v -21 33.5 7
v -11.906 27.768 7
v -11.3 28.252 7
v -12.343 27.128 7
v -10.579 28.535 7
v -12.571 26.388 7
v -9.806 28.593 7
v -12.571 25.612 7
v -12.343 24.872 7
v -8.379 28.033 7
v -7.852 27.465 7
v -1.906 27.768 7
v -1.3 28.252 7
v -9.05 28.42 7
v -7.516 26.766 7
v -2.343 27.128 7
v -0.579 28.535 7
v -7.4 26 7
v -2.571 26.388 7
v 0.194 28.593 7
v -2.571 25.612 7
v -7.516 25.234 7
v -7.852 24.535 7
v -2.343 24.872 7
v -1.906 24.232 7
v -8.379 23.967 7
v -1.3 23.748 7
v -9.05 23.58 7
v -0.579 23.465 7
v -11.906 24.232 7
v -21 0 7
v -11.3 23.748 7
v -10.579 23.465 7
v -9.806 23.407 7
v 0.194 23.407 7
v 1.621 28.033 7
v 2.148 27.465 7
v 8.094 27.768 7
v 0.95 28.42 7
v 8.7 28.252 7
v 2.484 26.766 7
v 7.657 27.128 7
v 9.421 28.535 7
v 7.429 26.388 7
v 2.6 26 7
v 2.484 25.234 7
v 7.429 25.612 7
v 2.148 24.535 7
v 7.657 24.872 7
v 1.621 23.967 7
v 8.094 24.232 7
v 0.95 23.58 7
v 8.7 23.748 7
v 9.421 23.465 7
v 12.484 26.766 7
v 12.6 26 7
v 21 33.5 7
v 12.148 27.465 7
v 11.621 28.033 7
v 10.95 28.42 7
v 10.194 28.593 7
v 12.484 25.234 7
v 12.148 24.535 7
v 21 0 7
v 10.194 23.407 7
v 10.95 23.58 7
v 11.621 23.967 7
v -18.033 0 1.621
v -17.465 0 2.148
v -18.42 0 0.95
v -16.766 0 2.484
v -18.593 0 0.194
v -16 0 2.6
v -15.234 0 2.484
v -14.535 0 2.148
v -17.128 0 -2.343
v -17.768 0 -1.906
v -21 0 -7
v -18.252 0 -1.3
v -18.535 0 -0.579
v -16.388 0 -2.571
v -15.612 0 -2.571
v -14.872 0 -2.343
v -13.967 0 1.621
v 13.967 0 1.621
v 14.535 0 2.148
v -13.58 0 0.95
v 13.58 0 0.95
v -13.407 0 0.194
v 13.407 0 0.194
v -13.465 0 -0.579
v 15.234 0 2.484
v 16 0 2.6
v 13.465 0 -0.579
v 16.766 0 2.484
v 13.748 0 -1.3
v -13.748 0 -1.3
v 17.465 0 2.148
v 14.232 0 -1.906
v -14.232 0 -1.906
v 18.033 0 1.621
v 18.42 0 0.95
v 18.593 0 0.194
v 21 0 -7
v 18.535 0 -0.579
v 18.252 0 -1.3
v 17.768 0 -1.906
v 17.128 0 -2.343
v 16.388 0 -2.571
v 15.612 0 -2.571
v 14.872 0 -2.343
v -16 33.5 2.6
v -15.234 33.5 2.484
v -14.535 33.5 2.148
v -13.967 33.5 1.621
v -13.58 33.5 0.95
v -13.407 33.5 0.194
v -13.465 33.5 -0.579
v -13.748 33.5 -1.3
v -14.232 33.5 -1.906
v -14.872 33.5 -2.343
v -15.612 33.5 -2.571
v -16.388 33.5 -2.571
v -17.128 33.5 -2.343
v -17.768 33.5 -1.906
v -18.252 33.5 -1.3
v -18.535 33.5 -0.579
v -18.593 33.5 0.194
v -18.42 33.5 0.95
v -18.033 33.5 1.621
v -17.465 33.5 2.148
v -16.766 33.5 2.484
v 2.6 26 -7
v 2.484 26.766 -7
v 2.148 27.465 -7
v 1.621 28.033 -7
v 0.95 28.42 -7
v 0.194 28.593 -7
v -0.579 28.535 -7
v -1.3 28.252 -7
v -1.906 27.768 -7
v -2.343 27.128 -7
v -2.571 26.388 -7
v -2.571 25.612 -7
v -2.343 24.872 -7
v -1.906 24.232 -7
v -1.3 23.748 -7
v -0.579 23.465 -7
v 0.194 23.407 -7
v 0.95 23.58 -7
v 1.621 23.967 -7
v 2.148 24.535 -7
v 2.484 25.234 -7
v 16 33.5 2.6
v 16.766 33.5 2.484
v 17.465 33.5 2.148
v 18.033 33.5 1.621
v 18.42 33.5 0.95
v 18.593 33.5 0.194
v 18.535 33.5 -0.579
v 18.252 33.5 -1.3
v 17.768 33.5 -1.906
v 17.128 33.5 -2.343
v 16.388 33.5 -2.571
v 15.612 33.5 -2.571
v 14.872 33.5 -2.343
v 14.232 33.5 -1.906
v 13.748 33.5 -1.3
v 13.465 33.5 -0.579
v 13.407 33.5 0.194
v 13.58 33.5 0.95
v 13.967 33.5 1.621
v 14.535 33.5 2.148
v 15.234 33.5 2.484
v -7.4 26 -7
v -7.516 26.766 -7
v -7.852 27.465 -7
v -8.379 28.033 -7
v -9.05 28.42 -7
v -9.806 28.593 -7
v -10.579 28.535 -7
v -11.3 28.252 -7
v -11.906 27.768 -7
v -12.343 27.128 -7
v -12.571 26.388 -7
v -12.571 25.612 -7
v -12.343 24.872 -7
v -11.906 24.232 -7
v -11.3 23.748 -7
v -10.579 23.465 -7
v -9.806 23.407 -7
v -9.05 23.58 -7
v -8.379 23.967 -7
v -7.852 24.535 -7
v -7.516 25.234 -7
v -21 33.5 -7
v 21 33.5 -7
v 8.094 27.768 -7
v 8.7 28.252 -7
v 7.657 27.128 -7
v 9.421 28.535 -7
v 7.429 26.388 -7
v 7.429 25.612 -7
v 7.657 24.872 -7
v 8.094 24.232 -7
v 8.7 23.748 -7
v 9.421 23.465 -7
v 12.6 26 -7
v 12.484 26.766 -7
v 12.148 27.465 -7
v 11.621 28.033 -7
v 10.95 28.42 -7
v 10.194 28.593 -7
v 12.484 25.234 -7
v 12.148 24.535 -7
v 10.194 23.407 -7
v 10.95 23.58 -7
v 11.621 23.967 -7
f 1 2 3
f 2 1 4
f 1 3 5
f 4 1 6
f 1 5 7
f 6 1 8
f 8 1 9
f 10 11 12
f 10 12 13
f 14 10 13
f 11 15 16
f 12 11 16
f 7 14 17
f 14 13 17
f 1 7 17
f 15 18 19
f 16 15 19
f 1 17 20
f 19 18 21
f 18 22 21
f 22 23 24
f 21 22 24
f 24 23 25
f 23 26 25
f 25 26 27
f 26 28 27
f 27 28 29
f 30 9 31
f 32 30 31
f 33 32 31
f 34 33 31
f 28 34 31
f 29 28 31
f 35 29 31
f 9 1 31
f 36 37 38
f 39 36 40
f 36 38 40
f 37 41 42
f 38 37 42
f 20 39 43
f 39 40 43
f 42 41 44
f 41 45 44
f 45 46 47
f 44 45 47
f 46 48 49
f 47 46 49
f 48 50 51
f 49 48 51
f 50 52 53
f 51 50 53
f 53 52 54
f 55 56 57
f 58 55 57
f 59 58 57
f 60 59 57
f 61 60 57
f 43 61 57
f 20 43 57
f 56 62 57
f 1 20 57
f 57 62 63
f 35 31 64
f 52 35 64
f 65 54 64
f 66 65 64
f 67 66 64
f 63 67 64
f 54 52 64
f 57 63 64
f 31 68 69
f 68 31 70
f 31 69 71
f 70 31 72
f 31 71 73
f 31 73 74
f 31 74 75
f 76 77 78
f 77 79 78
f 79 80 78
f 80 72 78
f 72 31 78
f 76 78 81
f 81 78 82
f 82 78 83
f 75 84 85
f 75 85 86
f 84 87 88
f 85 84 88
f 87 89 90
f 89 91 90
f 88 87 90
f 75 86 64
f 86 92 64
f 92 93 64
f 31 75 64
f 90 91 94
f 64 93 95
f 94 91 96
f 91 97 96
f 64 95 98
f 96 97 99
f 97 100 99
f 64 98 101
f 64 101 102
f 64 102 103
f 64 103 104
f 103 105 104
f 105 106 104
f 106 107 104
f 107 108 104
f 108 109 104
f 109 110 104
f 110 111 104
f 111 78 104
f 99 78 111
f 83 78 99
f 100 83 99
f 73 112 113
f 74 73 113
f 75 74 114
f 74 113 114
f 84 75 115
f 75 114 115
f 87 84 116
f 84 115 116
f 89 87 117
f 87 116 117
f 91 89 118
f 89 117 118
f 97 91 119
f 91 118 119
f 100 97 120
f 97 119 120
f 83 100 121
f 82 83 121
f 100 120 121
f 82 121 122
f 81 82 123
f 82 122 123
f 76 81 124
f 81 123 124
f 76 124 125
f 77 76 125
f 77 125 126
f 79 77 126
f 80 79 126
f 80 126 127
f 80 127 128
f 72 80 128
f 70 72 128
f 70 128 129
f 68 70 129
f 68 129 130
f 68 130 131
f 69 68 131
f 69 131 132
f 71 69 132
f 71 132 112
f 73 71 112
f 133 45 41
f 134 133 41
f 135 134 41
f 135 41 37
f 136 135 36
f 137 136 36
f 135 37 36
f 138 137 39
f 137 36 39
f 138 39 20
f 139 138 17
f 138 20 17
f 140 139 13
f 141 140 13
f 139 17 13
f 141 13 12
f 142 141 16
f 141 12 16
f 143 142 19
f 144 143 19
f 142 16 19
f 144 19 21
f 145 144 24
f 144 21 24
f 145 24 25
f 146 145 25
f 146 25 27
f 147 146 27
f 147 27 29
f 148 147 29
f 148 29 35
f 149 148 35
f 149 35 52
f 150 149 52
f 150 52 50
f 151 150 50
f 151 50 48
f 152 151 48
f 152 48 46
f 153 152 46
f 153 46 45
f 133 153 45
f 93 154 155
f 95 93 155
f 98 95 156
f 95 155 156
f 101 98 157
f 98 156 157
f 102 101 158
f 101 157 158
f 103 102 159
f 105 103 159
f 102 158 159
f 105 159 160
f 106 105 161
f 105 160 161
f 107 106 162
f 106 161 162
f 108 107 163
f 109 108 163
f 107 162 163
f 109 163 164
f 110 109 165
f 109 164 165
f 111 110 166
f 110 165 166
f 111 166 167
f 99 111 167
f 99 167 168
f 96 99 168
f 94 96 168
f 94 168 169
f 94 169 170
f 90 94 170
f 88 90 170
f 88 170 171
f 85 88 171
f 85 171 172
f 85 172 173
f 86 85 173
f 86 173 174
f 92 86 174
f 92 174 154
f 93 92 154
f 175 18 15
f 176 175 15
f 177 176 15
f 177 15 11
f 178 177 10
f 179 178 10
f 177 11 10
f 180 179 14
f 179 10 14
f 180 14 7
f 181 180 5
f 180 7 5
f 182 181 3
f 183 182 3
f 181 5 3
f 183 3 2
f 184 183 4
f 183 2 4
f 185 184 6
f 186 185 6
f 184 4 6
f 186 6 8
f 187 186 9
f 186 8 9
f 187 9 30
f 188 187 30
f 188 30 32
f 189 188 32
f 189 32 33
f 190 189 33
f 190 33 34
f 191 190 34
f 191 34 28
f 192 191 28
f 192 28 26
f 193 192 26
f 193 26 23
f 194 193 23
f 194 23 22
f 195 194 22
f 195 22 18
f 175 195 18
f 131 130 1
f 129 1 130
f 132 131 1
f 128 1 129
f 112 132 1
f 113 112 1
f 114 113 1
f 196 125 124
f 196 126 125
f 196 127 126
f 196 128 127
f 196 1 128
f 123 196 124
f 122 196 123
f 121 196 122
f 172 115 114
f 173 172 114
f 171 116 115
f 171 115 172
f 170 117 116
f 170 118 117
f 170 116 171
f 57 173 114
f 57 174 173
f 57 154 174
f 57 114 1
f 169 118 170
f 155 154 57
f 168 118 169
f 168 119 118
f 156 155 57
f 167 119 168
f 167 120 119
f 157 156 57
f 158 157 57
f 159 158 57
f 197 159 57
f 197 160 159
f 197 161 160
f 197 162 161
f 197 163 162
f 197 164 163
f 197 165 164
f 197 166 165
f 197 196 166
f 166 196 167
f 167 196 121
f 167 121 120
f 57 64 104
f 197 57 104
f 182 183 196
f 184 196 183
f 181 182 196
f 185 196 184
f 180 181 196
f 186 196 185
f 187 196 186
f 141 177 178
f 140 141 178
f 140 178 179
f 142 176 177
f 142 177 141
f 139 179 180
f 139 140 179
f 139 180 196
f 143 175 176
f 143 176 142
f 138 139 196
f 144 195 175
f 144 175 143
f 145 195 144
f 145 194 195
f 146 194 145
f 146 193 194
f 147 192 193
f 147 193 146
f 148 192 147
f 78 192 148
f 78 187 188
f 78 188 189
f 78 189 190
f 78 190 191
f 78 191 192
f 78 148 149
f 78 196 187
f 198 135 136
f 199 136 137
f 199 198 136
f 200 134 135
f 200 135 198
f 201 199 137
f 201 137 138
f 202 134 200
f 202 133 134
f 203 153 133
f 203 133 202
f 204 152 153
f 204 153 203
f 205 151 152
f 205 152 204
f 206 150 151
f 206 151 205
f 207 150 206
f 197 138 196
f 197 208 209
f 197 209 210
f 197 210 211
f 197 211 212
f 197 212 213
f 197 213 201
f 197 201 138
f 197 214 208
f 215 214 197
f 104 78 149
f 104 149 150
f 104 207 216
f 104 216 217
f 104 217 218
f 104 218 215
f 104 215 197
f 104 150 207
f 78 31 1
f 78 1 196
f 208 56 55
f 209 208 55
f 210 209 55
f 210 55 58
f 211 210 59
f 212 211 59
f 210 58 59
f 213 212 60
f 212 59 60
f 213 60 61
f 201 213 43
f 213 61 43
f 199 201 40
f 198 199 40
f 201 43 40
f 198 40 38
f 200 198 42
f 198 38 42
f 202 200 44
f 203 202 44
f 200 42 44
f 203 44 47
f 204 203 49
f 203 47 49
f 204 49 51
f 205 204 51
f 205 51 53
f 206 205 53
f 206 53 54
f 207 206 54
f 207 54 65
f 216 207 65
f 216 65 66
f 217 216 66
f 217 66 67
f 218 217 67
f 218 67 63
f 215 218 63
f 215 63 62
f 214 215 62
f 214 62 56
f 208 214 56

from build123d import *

# Parameters (mm, degrees)
SKETCH3_W           = 42
SKETCH3_H           = 14
BOSS_EXTRUDE2_DEPTH = 33.5
SKETCH4_R           = 2.6
CUT_EXTRUDE2_DEPTH  = 41.152833026
SKETCH5_R           = 2.6
CUT_EXTRUDE3_DEPTH  = 42.943414263


with BuildPart() as part:
    # Sketch3 → Boss-Extrude2 (new body)
    with BuildSketch(Plane(origin=(0, 0, 0), x_dir=(1, 0, 0), z_dir=(0, 1, 0))):
        Rectangle(SKETCH3_W, SKETCH3_H)
    extrude(amount=BOSS_EXTRUDE2_DEPTH)

    # Sketch4 → Cut-Extrude2 (cut, through all)
    with BuildSketch(Plane(origin=(0, 33.5, 0), x_dir=(1, 0, 0), z_dir=(0, 1, 0))):
        with Locations(Location((-16, 0, 0), (0, 0, 270))):
            Circle(SKETCH4_R)
        with Locations(Location((16, 0, 0), (0, 0, 270))):
            Circle(SKETCH4_R)
    extrude(amount=-CUT_EXTRUDE2_DEPTH, mode=Mode.SUBTRACT)

    # Sketch5 → Cut-Extrude3 (cut, through all)
    with BuildSketch(Plane.XY.offset(7)):
        with Locations((0, 26)):
            Circle(SKETCH5_R)
        with Locations((10, 26)):
            Circle(SKETCH5_R)
        with Locations((-10, 26)):
            Circle(SKETCH5_R)
    extrude(amount=-CUT_EXTRUDE3_DEPTH, mode=Mode.SUBTRACT)


solid = part.part
